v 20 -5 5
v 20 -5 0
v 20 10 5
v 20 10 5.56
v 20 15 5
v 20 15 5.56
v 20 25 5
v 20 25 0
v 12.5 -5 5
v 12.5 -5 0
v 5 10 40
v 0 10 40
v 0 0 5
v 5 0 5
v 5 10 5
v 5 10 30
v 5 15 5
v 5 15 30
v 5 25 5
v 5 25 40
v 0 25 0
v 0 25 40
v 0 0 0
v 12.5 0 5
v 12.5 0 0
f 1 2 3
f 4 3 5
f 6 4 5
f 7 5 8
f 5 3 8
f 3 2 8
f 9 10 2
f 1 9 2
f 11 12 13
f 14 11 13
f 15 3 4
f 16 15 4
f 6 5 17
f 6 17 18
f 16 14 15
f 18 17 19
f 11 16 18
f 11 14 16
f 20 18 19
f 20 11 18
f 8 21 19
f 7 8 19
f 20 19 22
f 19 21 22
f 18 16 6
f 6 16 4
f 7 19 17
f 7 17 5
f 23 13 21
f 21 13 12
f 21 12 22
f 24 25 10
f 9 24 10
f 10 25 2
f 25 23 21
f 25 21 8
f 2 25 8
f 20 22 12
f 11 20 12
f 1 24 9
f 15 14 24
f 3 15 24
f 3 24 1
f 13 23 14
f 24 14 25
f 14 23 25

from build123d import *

# Parameters (mm, degrees)
F1_DEPTH = 5
F3_DEPTH = 5
F4_W     = 5
F4_H     = 25
F5_DEPTH = 20
F7_DEPTH = 25


with BuildPart() as f1:
    # F0 (on Top) → F1 (new body)
    with BuildSketch(Plane.XY):
        Polygon((0, 25), (0, 0), (12.5, 0), (12.5, -5), (20, -5), (20, 25), align=None)
    extrude(amount=F1_DEPTH)

    # F2 (on Right) → F3 (join)
    with BuildSketch(Plane.YZ):
        Polygon((10, 40), (0, 5), (25, 5), (25, 40), align=None)
    extrude(amount=F3_DEPTH)

    # F4 (on Right) → F5 (join)
    with BuildSketch(Plane.YZ):
        with Locations((12.5, 17.5)):
            Rectangle(F4_W, F4_H)
    extrude(amount=F5_DEPTH)

    # F6 (on Front) → F7 (cut)
    with BuildSketch(Plane.XZ):
        Polygon((20.343749, 30), (5, 30), (20.343749, 5), align=None)
    extrude(amount=-F7_DEPTH, mode=Mode.SUBTRACT)


solid = f1.part
